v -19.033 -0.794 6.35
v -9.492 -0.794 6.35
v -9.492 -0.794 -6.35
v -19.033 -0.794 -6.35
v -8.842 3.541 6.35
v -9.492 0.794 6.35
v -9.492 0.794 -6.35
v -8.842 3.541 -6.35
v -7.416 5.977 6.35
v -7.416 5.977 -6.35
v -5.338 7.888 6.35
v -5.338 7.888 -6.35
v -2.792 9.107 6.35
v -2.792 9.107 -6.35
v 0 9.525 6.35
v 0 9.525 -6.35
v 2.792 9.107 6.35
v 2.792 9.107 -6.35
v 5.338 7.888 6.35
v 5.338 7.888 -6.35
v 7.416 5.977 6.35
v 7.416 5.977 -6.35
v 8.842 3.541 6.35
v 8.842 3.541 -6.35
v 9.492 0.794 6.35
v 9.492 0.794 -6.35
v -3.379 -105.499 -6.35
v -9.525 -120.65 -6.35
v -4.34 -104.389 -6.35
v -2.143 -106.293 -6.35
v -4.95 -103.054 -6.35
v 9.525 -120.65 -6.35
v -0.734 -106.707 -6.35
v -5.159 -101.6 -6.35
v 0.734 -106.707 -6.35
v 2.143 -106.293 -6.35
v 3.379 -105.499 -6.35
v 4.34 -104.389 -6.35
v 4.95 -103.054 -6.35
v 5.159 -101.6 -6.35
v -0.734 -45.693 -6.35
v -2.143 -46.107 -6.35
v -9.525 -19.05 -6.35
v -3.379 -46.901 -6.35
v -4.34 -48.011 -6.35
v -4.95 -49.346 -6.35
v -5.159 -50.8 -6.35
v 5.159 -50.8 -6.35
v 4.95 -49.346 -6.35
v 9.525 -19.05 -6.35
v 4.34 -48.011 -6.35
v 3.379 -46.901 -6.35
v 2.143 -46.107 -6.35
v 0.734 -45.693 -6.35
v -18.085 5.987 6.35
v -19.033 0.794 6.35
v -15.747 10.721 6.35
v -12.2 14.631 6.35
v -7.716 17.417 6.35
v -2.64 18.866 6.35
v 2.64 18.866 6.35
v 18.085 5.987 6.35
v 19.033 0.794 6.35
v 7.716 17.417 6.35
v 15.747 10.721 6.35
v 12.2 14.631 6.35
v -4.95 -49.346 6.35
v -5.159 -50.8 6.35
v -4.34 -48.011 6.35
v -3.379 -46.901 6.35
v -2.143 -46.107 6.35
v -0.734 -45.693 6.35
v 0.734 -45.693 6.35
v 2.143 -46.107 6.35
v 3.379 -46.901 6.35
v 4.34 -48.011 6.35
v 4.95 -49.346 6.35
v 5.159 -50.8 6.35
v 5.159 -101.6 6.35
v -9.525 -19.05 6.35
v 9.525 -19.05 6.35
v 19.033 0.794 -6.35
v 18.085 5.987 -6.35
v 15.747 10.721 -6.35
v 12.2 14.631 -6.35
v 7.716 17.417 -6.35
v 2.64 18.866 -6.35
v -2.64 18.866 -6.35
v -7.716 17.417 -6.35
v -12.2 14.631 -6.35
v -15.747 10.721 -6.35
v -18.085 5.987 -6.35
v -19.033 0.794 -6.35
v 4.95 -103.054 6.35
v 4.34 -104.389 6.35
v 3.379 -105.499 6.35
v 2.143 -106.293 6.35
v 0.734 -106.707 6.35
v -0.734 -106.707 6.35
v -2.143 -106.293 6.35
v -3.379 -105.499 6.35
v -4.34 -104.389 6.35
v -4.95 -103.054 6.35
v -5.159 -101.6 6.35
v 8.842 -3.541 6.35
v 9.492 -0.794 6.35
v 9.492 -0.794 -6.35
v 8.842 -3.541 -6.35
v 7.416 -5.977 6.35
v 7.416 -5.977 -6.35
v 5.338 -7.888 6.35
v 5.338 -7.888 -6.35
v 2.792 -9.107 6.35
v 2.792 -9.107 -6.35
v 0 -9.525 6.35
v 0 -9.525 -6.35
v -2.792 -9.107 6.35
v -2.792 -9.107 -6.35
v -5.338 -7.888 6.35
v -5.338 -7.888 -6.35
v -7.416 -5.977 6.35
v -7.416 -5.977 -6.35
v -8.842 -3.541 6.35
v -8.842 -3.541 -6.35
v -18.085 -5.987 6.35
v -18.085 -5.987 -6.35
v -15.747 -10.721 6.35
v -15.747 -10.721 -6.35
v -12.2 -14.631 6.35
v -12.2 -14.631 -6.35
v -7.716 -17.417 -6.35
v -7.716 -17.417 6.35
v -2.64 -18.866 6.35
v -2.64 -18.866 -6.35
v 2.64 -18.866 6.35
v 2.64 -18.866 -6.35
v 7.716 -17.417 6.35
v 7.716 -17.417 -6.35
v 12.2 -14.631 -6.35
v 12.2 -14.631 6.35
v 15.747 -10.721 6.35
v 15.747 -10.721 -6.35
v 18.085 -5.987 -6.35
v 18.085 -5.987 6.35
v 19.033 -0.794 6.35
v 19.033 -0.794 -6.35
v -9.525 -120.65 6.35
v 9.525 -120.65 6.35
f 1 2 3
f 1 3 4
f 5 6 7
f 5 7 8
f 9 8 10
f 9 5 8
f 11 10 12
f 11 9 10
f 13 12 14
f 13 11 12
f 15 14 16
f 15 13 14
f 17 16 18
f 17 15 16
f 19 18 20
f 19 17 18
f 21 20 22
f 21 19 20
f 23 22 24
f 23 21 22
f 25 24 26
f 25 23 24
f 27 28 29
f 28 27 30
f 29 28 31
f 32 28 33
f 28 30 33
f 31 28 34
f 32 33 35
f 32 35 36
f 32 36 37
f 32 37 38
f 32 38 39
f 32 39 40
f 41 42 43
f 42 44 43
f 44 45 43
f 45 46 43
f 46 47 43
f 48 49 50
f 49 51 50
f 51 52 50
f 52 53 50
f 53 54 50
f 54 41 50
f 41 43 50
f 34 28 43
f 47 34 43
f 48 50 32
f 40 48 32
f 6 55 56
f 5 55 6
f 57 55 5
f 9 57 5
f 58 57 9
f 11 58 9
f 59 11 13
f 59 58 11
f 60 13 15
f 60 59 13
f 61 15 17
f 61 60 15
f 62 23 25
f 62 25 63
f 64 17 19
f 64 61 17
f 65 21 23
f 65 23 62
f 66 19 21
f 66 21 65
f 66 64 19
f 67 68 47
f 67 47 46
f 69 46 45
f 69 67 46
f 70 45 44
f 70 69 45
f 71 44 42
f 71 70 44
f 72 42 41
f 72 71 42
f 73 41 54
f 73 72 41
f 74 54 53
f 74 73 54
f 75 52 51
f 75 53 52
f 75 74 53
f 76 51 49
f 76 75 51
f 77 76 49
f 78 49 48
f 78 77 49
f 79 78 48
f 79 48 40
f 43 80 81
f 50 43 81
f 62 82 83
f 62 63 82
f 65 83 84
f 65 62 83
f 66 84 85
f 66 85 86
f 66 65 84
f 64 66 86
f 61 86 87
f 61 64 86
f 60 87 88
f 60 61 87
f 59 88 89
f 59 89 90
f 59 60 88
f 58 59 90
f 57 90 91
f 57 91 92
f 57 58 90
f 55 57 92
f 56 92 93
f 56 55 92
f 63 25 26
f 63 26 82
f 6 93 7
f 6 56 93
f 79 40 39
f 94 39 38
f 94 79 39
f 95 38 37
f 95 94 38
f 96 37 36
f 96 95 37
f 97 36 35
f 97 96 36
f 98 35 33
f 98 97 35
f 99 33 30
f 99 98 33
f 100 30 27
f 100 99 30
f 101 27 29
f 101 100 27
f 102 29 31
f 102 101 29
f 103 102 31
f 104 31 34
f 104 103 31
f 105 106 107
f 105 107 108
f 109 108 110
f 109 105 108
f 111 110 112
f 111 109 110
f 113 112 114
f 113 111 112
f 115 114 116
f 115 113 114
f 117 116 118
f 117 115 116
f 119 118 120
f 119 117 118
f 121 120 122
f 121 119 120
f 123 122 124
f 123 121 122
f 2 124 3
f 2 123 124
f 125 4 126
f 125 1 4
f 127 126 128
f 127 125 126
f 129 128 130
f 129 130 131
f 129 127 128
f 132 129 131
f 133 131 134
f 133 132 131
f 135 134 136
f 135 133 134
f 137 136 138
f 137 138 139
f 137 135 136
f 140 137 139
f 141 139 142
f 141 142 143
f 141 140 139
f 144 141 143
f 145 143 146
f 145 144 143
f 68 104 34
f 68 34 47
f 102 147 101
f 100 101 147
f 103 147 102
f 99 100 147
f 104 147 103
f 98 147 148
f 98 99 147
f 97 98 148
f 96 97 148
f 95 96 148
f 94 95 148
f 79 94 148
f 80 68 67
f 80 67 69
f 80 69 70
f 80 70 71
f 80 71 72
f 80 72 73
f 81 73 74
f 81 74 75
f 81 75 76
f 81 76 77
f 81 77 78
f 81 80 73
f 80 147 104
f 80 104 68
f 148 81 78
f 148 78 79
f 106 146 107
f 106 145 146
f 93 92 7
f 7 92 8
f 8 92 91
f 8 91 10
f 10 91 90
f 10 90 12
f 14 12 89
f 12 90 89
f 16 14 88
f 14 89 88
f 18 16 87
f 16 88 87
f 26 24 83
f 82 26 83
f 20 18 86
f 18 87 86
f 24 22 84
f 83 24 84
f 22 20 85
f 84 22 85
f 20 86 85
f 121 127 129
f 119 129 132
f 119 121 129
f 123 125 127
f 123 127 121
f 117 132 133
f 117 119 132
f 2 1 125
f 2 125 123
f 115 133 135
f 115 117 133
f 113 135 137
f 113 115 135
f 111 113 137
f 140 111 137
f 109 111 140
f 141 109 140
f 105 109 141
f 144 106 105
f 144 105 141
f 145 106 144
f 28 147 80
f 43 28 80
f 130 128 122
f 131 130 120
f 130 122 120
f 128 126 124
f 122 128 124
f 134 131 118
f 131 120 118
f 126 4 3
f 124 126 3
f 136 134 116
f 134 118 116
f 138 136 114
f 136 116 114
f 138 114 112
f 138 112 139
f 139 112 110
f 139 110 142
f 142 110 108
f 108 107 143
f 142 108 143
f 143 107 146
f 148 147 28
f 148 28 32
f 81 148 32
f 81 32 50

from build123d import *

# Parameters (mm, degrees)
EXTRUDE1_DEPTH     = 6.35
EXTRUDE1_2_DEPTH   = 6.35
SKETCH2_W          = 19.05
SKETCH2_H          = 101.6
EXTRUDE2_DEPTH     = 12.7
CUT_EXTRUDE1_DEPTH = 123.80059023


with BuildPart() as part:
    # Sketch1 → Extrude1 (new, symmetric)
    with BuildSketch(Plane.XY):
        with BuildLine():
            Line((-19.033456358, 0.79375), (-9.491869465, 0.79375))
            ThreePointArc((-9.491869465, 0.79375), (0, 9.525), (9.491869465, 0.79375))
            Line((9.491869465, 0.79375), (19.033456358, 0.79375))
            ThreePointArc((19.033456358, 0.79375), (0, 19.05), (-19.033456358, 0.79375))
        make_face()
    extrude(amount=EXTRUDE1_DEPTH, both=True)


with BuildPart() as body_2:
    # Sketch1 → Extrude1 2 (new, symmetric)
    with BuildSketch(Plane.XY):
        with BuildLine():
            Line((19.033456358, -0.79375), (9.491869465, -0.79375))
            ThreePointArc((9.491869465, -0.79375), (0, -9.525), (-9.491869465, -0.79375))
            Line((-9.491869465, -0.79375), (-19.033456358, -0.79375))
            ThreePointArc((-19.033456358, -0.79375), (0, -19.05), (19.033456358, -0.79375))
        make_face()
    extrude(amount=EXTRUDE1_2_DEPTH, both=True)


with BuildPart() as body_3:
    # Sketch2 → Extrude2 (new body)
    with BuildSketch(Plane.XY.offset(6.35)):
        with Locations((0, -69.85)):
            Rectangle(SKETCH2_W, SKETCH2_H)
    extrude(amount=-EXTRUDE2_DEPTH)

    # Sketch3 → Cut-Extrude1 (cut, through all)
    with BuildSketch(Plane.XY.offset(6.35)):
        with BuildLine():
            Line((-5.159375, -101.6), (-5.159375, -50.8))
            ThreePointArc((-5.159375, -50.8), (0, -45.640625), (5.159375, -50.8))
            Line((5.159375, -50.8), (5.159375, -101.6))
            ThreePointArc((5.159375, -101.6), (0, -106.759375), (-5.159375, -101.6))
        make_face()
    extrude(amount=-CUT_EXTRUDE1_DEPTH, mode=Mode.SUBTRACT)


solid = Compound([part.part, body_2.part, body_3.part])
